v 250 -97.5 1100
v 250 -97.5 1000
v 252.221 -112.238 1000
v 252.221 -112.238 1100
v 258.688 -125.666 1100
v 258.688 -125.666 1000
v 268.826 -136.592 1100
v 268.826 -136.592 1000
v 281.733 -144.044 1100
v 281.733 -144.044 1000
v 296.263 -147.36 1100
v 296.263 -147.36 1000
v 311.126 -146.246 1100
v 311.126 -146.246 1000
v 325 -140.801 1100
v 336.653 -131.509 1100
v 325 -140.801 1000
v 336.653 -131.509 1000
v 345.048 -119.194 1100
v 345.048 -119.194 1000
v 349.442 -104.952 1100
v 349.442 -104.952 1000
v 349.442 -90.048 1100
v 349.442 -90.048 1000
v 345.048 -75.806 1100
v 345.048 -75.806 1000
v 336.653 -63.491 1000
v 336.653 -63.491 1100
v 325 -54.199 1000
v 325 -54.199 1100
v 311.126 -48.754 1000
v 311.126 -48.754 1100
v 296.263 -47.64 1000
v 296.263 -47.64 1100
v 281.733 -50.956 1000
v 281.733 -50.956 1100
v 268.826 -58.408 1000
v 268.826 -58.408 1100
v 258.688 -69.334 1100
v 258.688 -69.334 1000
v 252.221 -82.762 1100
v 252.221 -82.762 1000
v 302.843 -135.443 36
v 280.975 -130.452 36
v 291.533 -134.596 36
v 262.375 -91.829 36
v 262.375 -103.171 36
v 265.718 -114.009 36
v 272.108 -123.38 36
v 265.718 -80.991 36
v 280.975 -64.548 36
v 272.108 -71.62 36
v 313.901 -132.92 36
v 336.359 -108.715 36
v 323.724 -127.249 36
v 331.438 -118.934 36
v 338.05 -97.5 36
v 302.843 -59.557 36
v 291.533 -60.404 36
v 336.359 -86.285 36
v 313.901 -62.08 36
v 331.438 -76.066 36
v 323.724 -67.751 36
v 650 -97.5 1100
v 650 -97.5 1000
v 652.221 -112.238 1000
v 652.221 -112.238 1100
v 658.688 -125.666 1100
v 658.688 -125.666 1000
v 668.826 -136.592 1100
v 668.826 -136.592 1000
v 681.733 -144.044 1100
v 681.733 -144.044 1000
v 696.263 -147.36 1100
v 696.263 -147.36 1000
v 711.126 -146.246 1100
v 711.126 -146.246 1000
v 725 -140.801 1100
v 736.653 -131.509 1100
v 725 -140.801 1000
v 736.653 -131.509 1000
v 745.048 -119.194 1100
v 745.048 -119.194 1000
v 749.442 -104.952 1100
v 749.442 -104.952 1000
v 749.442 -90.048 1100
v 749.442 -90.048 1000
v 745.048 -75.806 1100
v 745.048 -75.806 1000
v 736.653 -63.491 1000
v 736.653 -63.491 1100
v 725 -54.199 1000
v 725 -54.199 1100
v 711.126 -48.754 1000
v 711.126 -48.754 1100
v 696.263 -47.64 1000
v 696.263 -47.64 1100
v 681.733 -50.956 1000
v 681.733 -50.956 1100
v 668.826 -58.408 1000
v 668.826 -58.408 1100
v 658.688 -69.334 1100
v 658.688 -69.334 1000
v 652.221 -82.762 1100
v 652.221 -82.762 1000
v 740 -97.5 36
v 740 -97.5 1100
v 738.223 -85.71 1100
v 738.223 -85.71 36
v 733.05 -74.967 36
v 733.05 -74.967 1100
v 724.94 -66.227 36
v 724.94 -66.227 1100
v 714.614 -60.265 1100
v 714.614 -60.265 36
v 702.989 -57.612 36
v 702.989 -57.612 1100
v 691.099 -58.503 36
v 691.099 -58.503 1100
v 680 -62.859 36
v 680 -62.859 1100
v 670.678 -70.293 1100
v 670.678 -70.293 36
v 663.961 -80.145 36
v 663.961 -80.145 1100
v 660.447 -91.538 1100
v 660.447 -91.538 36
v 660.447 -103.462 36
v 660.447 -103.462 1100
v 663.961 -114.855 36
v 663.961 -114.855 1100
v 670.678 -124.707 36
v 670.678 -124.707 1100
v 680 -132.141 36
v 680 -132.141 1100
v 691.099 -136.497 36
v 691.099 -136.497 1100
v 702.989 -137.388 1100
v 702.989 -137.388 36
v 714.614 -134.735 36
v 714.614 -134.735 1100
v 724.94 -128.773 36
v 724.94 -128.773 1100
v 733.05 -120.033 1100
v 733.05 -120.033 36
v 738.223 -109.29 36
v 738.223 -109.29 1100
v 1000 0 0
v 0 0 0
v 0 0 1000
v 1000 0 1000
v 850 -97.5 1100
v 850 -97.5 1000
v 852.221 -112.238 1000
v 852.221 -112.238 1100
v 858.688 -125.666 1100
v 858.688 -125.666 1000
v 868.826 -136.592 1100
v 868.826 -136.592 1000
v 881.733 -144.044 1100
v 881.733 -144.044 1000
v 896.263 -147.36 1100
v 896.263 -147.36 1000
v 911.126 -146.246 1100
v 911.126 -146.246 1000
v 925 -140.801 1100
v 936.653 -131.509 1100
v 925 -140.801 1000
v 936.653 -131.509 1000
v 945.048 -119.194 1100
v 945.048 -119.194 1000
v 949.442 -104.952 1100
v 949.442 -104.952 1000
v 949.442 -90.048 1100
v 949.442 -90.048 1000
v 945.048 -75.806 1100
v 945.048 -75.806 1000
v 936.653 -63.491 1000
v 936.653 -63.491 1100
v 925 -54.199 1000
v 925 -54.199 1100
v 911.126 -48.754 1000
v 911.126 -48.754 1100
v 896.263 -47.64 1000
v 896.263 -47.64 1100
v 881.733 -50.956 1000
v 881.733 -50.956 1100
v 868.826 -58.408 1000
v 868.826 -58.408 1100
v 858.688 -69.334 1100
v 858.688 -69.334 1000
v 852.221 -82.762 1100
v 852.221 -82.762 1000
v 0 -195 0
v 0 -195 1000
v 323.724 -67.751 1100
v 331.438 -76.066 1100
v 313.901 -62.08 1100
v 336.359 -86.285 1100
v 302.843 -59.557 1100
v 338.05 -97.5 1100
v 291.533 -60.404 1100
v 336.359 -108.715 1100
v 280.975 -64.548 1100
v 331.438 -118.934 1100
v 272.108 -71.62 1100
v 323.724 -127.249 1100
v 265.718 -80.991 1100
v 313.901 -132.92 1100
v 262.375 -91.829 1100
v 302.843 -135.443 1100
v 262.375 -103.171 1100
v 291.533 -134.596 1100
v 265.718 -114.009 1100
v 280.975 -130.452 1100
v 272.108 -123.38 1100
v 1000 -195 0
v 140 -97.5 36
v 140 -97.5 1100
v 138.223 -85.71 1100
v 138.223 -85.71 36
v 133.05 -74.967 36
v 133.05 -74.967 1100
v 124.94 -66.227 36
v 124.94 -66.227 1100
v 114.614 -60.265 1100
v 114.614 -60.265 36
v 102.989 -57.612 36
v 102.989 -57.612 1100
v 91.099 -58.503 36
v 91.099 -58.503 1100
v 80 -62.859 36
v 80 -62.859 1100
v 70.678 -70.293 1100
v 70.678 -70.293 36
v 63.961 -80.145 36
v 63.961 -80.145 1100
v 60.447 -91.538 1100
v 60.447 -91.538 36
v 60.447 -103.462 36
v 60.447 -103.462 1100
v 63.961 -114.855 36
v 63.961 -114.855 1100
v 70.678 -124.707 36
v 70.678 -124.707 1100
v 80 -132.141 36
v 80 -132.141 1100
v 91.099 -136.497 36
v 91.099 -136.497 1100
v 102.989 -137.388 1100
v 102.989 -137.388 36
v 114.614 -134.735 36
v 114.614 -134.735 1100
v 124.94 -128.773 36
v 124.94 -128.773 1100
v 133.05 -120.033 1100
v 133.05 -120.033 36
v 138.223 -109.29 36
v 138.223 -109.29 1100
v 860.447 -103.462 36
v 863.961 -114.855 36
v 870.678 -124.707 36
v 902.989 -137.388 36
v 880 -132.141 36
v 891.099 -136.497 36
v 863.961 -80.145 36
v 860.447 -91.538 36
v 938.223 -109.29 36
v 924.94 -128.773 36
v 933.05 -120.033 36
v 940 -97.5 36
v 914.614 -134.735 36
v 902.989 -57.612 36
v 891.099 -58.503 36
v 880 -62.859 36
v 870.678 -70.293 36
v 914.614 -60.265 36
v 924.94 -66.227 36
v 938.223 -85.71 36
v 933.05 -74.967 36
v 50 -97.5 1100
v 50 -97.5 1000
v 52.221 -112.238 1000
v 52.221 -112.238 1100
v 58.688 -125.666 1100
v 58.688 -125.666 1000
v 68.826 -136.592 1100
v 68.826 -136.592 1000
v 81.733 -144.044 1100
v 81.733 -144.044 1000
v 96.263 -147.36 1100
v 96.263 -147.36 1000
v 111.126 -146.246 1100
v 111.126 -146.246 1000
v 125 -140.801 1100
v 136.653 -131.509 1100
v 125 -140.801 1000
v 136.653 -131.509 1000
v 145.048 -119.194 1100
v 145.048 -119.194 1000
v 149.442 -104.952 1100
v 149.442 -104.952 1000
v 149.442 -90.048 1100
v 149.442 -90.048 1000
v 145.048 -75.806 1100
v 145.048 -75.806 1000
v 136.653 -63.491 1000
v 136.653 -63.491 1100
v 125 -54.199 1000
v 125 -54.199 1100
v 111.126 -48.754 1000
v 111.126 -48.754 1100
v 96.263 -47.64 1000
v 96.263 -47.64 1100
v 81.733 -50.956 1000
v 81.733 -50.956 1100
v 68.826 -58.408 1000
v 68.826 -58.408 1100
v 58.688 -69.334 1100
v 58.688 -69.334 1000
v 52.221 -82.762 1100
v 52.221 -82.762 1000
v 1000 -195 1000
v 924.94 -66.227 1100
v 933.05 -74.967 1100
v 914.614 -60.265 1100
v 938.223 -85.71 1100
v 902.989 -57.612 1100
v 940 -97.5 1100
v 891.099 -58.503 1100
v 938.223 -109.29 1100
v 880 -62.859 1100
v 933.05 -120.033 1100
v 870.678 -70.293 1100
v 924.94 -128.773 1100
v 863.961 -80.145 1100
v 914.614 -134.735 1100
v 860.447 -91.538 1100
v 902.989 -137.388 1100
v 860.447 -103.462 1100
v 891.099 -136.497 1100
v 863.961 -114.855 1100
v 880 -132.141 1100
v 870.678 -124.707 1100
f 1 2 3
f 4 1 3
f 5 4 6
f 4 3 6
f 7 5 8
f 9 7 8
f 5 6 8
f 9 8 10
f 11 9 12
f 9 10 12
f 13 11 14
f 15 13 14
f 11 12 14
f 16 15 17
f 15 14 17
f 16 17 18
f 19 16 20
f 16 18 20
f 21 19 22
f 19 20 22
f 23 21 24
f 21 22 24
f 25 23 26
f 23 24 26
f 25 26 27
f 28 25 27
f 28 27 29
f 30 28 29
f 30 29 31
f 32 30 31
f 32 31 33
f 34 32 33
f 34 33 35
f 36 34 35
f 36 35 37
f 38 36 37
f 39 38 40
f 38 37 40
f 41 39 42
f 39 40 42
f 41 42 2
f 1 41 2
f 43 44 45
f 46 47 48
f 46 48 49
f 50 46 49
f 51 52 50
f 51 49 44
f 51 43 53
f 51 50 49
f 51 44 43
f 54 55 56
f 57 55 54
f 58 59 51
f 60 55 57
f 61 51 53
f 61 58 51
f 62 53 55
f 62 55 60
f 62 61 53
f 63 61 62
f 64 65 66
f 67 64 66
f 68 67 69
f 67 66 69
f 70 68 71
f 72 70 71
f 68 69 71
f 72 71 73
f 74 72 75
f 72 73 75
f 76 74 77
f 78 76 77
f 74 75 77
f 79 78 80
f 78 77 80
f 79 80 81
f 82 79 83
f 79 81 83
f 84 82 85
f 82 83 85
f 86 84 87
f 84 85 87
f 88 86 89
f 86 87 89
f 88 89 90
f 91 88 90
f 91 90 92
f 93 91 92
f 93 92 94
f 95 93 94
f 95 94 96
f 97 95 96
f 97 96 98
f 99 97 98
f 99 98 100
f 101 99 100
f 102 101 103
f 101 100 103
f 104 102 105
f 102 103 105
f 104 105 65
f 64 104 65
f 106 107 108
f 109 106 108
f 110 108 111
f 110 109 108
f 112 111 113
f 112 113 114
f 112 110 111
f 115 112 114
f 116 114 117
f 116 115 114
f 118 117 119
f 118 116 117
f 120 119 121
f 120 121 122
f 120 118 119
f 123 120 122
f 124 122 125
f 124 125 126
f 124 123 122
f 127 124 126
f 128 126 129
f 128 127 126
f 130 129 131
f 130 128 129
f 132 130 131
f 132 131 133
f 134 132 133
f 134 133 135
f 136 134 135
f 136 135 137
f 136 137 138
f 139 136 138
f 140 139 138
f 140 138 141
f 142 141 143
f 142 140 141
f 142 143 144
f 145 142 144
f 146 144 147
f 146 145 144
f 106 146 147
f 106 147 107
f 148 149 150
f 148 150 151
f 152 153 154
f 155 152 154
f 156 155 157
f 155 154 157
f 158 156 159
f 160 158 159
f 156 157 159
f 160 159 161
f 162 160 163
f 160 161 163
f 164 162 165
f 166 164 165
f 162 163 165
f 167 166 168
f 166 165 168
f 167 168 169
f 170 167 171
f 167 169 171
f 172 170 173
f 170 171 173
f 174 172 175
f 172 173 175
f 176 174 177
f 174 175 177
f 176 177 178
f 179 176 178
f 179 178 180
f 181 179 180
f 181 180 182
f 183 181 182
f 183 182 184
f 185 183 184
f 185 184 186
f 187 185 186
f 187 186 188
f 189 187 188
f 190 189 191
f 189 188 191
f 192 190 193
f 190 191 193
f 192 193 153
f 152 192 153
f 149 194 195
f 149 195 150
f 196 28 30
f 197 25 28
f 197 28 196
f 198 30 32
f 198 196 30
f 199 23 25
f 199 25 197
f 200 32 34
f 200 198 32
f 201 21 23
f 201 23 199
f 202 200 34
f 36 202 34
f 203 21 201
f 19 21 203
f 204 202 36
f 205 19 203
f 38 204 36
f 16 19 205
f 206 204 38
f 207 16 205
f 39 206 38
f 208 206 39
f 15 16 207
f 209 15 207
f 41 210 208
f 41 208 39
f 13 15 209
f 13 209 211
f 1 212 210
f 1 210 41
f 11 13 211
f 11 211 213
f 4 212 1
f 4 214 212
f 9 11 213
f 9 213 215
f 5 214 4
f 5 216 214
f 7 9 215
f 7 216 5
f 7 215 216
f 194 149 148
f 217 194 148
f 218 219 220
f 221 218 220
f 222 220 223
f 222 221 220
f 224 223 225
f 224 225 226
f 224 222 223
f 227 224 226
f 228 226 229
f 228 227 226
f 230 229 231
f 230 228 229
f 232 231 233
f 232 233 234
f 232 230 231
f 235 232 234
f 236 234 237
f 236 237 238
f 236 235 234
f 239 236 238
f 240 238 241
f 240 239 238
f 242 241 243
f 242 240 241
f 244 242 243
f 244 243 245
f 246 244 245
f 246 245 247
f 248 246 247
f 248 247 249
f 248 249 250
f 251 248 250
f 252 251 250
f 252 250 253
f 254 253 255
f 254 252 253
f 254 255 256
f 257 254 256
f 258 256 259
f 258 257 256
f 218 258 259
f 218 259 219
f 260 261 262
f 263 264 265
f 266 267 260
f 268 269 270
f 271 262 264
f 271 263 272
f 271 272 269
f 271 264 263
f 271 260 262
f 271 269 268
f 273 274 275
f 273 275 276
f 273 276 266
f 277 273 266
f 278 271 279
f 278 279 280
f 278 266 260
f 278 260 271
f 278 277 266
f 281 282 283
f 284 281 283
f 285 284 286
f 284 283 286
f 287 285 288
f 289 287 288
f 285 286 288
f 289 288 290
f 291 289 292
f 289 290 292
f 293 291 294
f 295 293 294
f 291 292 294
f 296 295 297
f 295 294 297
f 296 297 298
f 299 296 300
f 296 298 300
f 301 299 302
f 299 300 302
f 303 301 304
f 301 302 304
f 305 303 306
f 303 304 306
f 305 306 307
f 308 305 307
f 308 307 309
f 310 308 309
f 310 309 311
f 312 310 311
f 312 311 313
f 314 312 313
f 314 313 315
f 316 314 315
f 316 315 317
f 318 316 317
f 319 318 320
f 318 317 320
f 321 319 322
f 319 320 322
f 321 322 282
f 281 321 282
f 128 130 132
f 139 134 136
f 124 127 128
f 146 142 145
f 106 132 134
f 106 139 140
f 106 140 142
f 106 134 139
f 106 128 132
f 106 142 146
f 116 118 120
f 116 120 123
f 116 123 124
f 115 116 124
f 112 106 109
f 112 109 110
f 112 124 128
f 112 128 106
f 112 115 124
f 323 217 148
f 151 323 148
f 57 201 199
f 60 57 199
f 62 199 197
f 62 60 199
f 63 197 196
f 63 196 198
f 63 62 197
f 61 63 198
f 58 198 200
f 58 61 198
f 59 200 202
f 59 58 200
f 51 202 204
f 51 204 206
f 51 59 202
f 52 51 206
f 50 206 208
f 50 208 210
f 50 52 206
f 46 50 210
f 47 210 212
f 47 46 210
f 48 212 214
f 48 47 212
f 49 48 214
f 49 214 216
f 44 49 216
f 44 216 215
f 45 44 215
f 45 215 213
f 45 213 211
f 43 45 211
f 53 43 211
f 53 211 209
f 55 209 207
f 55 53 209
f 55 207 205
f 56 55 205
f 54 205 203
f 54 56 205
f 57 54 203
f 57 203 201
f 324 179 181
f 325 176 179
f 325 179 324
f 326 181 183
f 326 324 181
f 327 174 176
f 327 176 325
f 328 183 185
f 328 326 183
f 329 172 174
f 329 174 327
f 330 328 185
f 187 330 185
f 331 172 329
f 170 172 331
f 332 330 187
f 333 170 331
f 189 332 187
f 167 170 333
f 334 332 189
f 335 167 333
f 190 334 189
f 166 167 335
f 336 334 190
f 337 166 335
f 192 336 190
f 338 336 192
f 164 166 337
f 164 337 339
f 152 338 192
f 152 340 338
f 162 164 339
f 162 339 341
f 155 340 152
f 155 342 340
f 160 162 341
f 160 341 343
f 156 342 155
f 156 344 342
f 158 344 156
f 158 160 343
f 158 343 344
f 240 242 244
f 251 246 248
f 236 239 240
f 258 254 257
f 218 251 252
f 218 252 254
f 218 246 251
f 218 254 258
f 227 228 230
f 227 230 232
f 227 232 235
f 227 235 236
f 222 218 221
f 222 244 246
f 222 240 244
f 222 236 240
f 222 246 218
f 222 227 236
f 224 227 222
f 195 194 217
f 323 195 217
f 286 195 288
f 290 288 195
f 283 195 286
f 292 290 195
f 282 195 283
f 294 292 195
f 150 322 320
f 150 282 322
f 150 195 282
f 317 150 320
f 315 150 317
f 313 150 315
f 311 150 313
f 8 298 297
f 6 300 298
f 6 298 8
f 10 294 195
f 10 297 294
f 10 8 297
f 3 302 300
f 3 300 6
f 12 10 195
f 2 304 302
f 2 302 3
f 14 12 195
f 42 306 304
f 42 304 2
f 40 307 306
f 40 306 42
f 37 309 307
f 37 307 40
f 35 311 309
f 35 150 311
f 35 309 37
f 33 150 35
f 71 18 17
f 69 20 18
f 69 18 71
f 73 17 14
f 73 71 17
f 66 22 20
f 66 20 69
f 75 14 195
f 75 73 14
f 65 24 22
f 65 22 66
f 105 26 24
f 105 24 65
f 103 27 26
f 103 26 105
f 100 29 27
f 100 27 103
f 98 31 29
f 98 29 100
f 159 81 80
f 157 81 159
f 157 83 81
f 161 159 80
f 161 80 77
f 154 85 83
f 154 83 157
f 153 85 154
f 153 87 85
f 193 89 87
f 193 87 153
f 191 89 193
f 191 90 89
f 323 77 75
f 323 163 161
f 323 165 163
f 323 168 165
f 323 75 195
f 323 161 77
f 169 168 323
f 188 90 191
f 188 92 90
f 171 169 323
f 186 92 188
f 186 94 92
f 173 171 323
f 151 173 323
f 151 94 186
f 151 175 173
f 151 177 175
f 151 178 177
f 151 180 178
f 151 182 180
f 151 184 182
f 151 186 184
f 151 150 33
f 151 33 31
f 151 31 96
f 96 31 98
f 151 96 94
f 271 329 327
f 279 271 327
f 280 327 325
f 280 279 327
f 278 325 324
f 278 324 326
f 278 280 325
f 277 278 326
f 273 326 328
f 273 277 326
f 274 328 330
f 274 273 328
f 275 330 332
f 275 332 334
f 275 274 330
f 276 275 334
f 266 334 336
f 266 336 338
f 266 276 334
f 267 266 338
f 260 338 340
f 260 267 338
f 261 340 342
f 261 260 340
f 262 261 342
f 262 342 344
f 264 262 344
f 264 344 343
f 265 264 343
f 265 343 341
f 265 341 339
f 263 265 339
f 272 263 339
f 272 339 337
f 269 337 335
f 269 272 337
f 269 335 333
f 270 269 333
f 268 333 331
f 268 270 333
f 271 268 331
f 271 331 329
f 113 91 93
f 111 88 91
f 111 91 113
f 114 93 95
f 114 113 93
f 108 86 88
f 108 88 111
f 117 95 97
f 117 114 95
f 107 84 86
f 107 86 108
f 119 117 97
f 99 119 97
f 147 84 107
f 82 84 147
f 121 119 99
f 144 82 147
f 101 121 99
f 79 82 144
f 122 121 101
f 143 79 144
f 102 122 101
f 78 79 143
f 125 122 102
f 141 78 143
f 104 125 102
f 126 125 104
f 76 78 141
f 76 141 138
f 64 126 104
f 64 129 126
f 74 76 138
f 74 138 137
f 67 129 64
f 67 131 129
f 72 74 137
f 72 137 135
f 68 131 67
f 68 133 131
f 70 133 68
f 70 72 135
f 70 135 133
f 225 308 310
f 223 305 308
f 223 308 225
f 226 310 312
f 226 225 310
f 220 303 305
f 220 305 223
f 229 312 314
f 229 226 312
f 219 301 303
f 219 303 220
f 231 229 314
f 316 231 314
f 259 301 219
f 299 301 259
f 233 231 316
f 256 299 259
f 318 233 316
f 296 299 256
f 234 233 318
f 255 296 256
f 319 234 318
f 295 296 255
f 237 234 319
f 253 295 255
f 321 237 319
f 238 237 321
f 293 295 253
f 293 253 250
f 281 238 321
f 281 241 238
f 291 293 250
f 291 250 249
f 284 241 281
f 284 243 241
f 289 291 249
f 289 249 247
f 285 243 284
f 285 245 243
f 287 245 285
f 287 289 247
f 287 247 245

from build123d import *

# Parameters (mm, degrees)
SKETCH1_W           = 1000
SKETCH1_H           = 195
BOSS_EXTRUDE1_DEPTH = 1000
SKETCH2_R           = 50
SKETCH2_R_2         = 40
SKETCH2_R_3         = 38.049771674
BOSS_EXTRUDE2_DEPTH = 100
CUT_EXTRUDE1_START  = -964
SKETCH5_R           = 40
SKETCH5_R_2         = 38.049771674
CUT_EXTRUDE1_DEPTH  = 964


with BuildPart() as part:
    # Sketch1 → Boss-Extrude1 (new body)
    with BuildSketch(Plane.XY):
        with Locations((500, -97.5)):
            Rectangle(SKETCH1_W, SKETCH1_H)
    extrude(amount=BOSS_EXTRUDE1_DEPTH)

    # Sketch2 → Boss-Extrude2 (add)
    # profile 1 of 4: a face of its own
    with BuildSketch(Plane.XY.offset(1000)):
        with Locations(Location((100, -97.5, 0), (0, 0, 180))):
            Circle(SKETCH2_R)
        with Locations((100, -97.5)):
            Circle(SKETCH2_R_2, mode=Mode.SUBTRACT)
    # profile 2 of 4: a face of its own
    with BuildSketch(Plane.XY.offset(1000)):
        with Locations(Location((300, -97.5, 0), (0, 0, 180))):
            Circle(SKETCH2_R)
        with Locations((300, -97.5)):
            Circle(SKETCH2_R_3, mode=Mode.SUBTRACT)
    # profile 3 of 4: a face of its own
    with BuildSketch(Plane.XY.offset(1000)):
        with Locations(Location((700, -97.5, 0), (0, 0, 180))):
            Circle(SKETCH2_R)
        with Locations((700, -97.5)):
            Circle(SKETCH2_R_2, mode=Mode.SUBTRACT)
    # profile 4 of 4: a face of its own
    with BuildSketch(Plane.XY.offset(1000)):
        with Locations(Location((900, -97.5, 0), (0, 0, 180))):
            Circle(SKETCH2_R)
        with Locations((900, -97.5)):
            Circle(SKETCH2_R_2, mode=Mode.SUBTRACT)
    extrude(amount=BOSS_EXTRUDE2_DEPTH)

    # Sketch5 → Cut-Extrude1 (cut)
    with BuildSketch(Plane.XY.offset(1000).offset(CUT_EXTRUDE1_START)):
        with Locations((100, -97.5)):
            Circle(SKETCH5_R)
        with Locations((300, -97.5)):
            Circle(SKETCH5_R_2)
        with Locations((700, -97.5)):
            Circle(SKETCH5_R)
        with Locations((900, -97.5)):
            Circle(SKETCH5_R)
    extrude(amount=CUT_EXTRUDE1_DEPTH, mode=Mode.SUBTRACT)


solid = part.part
